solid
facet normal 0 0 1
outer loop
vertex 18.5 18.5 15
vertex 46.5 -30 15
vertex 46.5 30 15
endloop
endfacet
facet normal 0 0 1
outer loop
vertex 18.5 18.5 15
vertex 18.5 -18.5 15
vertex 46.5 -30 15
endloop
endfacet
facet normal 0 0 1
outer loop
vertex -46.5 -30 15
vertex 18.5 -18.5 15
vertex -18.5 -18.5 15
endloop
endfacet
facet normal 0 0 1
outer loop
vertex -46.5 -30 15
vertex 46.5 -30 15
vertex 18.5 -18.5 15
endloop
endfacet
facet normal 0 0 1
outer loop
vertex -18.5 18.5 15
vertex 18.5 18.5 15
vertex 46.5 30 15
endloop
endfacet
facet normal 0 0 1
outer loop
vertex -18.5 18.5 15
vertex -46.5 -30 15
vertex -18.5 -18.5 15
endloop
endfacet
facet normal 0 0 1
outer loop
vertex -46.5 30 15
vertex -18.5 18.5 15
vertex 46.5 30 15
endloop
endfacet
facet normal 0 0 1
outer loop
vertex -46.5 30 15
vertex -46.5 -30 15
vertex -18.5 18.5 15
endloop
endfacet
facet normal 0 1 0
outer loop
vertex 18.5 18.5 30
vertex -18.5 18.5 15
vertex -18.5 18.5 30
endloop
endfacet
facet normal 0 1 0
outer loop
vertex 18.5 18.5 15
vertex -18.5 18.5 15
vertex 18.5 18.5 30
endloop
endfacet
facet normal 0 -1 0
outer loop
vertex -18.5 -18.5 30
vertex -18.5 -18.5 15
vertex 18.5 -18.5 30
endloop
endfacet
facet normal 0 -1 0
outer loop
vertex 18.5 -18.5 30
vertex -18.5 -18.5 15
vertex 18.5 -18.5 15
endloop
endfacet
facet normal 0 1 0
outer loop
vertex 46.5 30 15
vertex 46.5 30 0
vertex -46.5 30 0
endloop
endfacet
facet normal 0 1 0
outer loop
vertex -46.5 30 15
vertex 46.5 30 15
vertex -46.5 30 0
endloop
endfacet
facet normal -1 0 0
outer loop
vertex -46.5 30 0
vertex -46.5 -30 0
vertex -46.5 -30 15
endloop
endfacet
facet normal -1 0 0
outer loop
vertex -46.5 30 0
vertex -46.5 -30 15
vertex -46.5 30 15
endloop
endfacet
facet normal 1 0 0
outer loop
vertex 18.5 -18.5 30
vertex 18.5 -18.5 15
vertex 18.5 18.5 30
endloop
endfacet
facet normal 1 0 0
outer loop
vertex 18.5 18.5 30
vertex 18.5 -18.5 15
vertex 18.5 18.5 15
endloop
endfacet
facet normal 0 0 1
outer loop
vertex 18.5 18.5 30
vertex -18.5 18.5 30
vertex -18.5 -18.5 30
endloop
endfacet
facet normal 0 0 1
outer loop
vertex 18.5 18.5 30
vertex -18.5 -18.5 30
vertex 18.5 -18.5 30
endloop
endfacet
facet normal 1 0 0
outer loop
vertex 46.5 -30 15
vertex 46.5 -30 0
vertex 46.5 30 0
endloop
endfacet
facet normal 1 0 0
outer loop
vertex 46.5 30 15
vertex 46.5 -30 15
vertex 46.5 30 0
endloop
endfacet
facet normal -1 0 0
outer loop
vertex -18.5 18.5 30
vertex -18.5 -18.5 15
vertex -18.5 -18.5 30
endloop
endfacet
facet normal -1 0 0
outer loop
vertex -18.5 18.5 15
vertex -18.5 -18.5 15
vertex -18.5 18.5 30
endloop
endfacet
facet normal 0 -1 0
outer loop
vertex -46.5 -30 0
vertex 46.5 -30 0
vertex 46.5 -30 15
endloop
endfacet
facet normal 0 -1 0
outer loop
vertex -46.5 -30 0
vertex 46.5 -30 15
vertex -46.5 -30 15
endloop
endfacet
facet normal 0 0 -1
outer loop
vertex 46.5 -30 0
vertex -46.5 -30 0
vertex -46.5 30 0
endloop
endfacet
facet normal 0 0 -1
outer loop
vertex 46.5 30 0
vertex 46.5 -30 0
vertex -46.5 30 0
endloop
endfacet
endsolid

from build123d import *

# Parameters (mm, degrees)
SKETCH1_W           = 60
SKETCH1_H           = 93
BOSS_EXTRUDE1_DEPTH = 15
SKETCH2_W           = 37
SKETCH2_H           = 37
BOSS_EXTRUDE2_DEPTH = 15


with BuildPart() as part:
    # Sketch1 → Boss-Extrude1 (new body)
    with BuildSketch(Plane(origin=(0, 0, 0), x_dir=(0, 1, 0), z_dir=(0, 0, 1))):
        Rectangle(SKETCH1_W, SKETCH1_H)
    extrude(amount=BOSS_EXTRUDE1_DEPTH)

    # Sketch2 → Boss-Extrude2 (add)
    with BuildSketch(Plane.XY.offset(15)):
        Rectangle(SKETCH2_W, SKETCH2_H)
    extrude(amount=BOSS_EXTRUDE2_DEPTH)


solid = part.part
